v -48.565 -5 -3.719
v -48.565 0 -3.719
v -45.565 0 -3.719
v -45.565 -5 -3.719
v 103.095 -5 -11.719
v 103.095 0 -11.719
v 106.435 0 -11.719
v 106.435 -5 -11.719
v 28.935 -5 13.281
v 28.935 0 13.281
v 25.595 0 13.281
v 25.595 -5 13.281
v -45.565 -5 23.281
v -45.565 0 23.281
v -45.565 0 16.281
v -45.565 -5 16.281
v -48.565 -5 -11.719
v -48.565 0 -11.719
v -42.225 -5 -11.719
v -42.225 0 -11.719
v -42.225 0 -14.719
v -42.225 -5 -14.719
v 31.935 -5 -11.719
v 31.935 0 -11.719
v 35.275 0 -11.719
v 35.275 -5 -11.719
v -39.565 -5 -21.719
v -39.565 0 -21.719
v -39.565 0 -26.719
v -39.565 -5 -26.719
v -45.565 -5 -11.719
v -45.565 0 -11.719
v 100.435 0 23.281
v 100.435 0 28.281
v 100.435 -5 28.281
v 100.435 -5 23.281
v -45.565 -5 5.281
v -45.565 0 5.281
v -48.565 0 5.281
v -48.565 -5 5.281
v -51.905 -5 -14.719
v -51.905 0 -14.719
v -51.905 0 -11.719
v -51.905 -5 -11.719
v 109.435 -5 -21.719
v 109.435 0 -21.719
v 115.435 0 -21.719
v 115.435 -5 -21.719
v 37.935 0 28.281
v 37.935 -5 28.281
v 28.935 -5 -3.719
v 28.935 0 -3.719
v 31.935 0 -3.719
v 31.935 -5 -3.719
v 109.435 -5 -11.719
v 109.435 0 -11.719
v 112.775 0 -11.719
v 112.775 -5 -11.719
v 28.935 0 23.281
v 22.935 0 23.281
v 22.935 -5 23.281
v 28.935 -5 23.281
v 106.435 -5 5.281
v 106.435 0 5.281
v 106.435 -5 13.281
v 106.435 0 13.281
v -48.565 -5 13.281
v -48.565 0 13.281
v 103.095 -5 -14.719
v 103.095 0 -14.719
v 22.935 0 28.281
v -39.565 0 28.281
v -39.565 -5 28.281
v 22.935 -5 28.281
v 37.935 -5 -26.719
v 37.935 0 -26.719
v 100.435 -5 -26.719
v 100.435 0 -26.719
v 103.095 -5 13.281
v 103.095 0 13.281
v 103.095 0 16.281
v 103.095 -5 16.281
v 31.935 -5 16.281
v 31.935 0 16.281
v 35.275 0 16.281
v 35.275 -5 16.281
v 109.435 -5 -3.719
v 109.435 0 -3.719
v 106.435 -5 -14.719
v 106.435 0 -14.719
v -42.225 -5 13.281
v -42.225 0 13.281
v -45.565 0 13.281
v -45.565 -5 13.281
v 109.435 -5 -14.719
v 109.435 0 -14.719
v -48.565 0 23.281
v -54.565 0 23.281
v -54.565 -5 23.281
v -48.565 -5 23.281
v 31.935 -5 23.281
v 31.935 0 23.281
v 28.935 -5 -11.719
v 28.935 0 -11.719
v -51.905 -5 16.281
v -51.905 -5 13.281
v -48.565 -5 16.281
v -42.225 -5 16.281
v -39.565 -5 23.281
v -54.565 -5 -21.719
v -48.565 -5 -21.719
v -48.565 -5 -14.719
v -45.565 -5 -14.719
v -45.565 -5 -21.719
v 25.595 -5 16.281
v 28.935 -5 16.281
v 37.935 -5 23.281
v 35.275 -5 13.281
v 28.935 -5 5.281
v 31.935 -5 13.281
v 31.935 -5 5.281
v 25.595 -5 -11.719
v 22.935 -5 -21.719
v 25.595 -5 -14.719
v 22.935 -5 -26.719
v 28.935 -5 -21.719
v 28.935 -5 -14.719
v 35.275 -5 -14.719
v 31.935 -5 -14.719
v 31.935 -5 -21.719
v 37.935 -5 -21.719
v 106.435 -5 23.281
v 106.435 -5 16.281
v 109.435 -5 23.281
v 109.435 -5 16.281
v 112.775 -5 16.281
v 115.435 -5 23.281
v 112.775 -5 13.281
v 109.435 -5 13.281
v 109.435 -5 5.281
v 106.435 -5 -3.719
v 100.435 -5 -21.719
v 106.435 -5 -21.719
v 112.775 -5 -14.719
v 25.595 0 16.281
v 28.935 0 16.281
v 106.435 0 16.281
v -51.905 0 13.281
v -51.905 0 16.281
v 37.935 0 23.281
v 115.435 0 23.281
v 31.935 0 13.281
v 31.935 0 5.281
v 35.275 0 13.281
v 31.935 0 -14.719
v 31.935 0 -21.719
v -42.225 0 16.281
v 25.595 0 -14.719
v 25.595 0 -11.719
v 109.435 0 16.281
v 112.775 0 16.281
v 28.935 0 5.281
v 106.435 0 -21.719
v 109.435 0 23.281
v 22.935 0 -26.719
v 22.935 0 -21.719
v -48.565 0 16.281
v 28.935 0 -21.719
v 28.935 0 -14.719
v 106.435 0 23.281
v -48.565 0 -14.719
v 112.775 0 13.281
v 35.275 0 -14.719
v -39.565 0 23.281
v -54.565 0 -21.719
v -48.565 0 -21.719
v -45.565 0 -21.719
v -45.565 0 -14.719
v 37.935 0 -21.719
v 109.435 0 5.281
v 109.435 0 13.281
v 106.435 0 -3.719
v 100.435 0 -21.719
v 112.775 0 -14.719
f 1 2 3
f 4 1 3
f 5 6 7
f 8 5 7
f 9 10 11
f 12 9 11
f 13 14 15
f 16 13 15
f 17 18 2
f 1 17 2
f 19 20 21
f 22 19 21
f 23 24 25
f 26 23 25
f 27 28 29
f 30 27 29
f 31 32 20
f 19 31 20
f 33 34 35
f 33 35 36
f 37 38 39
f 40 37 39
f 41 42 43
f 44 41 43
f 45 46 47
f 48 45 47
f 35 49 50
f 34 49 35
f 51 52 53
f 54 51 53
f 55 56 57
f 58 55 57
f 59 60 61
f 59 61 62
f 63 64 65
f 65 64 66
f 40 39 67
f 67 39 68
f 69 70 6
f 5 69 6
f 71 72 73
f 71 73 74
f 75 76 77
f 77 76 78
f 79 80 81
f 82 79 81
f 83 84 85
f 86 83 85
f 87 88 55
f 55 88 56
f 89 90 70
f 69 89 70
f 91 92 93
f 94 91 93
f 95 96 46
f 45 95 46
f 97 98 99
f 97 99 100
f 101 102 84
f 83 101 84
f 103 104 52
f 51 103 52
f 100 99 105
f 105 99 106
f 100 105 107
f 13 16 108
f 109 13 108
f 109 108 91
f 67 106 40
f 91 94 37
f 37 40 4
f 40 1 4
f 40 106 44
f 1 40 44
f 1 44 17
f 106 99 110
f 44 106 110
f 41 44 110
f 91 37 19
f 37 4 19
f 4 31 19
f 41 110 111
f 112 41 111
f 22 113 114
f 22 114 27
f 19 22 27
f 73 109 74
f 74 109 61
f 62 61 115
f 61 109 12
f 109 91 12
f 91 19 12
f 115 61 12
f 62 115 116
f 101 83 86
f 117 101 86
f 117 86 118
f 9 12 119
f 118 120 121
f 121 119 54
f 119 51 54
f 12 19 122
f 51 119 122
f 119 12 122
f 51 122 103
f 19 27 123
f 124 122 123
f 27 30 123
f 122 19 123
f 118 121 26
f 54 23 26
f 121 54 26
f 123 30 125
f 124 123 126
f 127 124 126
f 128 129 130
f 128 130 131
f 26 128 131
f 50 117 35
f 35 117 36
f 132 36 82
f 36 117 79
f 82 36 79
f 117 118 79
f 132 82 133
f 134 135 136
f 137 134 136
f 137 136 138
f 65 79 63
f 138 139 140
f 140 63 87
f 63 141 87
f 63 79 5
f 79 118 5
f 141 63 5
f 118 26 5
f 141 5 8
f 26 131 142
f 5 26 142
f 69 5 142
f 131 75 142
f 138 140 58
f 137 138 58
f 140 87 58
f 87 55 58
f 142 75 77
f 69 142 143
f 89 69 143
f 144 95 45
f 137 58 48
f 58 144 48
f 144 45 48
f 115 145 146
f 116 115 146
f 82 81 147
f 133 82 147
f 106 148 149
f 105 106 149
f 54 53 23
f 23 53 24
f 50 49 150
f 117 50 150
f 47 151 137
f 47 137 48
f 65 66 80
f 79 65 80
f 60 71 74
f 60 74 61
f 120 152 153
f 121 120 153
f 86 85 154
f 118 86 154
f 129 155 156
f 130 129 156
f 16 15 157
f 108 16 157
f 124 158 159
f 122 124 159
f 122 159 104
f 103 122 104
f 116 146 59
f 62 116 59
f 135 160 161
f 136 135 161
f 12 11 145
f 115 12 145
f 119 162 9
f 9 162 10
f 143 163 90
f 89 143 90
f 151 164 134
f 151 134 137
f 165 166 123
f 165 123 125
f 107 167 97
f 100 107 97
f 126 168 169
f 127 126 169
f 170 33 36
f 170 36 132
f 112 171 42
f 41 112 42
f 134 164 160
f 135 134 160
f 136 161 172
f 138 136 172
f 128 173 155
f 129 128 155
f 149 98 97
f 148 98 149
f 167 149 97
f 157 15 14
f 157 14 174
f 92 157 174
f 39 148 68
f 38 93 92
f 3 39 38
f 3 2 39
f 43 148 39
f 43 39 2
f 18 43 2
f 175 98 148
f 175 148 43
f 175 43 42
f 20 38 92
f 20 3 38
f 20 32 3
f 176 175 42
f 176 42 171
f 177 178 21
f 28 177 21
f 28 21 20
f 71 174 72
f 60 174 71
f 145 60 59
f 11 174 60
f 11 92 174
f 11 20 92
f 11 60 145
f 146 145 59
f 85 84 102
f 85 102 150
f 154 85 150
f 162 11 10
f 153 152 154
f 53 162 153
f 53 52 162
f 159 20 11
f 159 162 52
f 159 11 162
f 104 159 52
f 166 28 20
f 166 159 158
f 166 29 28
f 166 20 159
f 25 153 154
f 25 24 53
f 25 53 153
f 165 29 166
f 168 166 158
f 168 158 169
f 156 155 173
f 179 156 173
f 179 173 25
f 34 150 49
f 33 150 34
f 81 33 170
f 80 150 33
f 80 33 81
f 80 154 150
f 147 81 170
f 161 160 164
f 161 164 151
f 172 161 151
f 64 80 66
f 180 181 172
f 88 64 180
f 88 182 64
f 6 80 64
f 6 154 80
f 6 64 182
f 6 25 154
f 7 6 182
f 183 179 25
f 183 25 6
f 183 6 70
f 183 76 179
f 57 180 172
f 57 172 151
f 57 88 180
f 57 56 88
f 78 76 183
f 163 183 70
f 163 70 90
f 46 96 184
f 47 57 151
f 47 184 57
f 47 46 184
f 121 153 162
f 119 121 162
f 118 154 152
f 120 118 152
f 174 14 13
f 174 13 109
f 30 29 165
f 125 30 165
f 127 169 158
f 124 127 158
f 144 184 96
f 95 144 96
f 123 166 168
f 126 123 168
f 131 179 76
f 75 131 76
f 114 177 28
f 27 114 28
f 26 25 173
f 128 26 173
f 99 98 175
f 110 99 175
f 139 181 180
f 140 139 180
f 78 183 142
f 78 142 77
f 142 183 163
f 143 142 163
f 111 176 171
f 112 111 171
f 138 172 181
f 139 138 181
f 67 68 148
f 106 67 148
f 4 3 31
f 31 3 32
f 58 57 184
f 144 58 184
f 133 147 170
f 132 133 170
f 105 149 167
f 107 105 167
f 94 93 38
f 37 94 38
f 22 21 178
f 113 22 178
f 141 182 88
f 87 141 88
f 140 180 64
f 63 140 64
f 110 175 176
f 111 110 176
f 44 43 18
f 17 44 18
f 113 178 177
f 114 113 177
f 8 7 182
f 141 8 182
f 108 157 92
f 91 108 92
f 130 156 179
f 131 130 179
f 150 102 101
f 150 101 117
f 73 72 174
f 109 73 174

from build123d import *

# Parameters (mm, degrees)
SCHIZZO1_W                   = 170
SCHIZZO1_H                   = 55
ESTRUSIONE_ESTRUSIONE2_DEPTH = 5
SCHIZZO2_W                   = 15
SCHIZZO2_H                   = 5
TAGLIO_ESTRUSIONE1_DEPTH     = 6
TAGLIO_ESTRUSIONE3_DEPTH     = 6


with BuildPart() as part:
    # Schizzo1 → Estrusione-Estrusione2 (new body)
    with BuildSketch(Plane(origin=(0, 0, 0), x_dir=(1, 0, 0), z_dir=(0, 1, 0))):
        with Locations((30.43505086, -0.781075862)):
            Rectangle(SCHIZZO1_W, SCHIZZO1_H)
    extrude(amount=-ESTRUSIONE_ESTRUSIONE2_DEPTH)

    # Schizzo2 → Taglio-Estrusione1 (cut, through all)
    with BuildSketch(Plane(origin=(0, 0, 0), x_dir=(1, 0, 0), z_dir=(0, 1, 0))):
        with Locations((-47.06494914, -25.781075862)):
            Rectangle(SCHIZZO2_W, SCHIZZO2_H)
        with Locations((-47.06494914, 24.218924138)):
            Rectangle(SCHIZZO2_W, SCHIZZO2_H)
        with Locations((107.93505086, -25.781075862)):
            Rectangle(SCHIZZO2_W, SCHIZZO2_H)
        with Locations((107.93505086, 24.218924138)):
            Rectangle(SCHIZZO2_W, SCHIZZO2_H)
        with Locations((30.43505086, -25.781075862)):
            Rectangle(SCHIZZO2_W, SCHIZZO2_H)
        with Locations((30.43505086, 24.218924138)):
            Rectangle(SCHIZZO2_W, SCHIZZO2_H)
    extrude(amount=-TAGLIO_ESTRUSIONE1_DEPTH, mode=Mode.SUBTRACT)

    # Schizzo3 → Taglio-Estrusione3 (cut, through all)
    with BuildSketch(Plane(origin=(0, 0, 0), x_dir=(1, 0, 0), z_dir=(0, 1, 0))):
        Polygon((-48.56494914, -23.281075862), (-45.56494914, -23.281075862), (-45.56494914, -16.281075862), (-42.22494914, -16.281075862), (-42.22494914, -13.281075862), (-45.56494914, -13.281075862), (-45.56494914, -5.281075862), (-48.56494914, -5.281075862), (-48.56494914, -13.281075862), (-51.90494914, -13.281075862), (-51.90494914, -16.281075862), (-48.56494914, -16.281075862), align=None)
        Polygon((28.93505086, -23.281075862), (31.93505086, -23.281075862), (31.93505086, -16.281075862), (35.27505086, -16.281075862), (35.27505086, -13.281075862), (31.93505086, -13.281075862), (31.93505086, -5.281075862), (28.93505086, -5.281075862), (28.93505086, -13.281075862), (25.59505086, -13.281075862), (25.59505086, -16.281075862), (28.93505086, -16.281075862), align=None)
        Polygon((106.43505086, -23.281075862), (109.43505086, -23.281075862), (109.43505086, -16.281075862), (112.77505086, -16.281075862), (112.77505086, -13.281075862), (109.43505086, -13.281075862), (109.43505086, -5.281075862), (106.43505086, -5.281075862), (106.43505086, -13.281075862), (103.09505086, -13.281075862), (103.09505086, -16.281075862), (106.43505086, -16.281075862), align=None)
        Polygon((106.43505086, 3.718924138), (109.43505086, 3.718924138), (109.43505086, 11.718924138), (112.77505086, 11.718924138), (112.77505086, 14.718924138), (109.43505086, 14.718924138), (109.43505086, 21.718924138), (106.43505086, 21.718924138), (106.43505086, 14.718924138), (103.09505086, 14.718924138), (103.09505086, 11.718924138), (106.43505086, 11.718924138), align=None)
        Polygon((28.93505086, 3.718924138), (31.93505086, 3.718924138), (31.93505086, 11.718924138), (35.27505086, 11.718924138), (35.27505086, 14.718924138), (31.93505086, 14.718924138), (31.93505086, 21.718924138), (28.93505086, 21.718924138), (28.93505086, 14.718924138), (25.59505086, 14.718924138), (25.59505086, 11.718924138), (28.93505086, 11.718924138), align=None)
        Polygon((-48.56494914, 3.718924138), (-45.56494914, 3.718924138), (-45.56494914, 11.718924138), (-42.22494914, 11.718924138), (-42.22494914, 14.718924138), (-45.56494914, 14.718924138), (-45.56494914, 21.718924138), (-48.56494914, 21.718924138), (-48.56494914, 14.718924138), (-51.90494914, 14.718924138), (-51.90494914, 11.718924138), (-48.56494914, 11.718924138), align=None)
    extrude(amount=-TAGLIO_ESTRUSIONE3_DEPTH, mode=Mode.SUBTRACT)


solid = part.part
